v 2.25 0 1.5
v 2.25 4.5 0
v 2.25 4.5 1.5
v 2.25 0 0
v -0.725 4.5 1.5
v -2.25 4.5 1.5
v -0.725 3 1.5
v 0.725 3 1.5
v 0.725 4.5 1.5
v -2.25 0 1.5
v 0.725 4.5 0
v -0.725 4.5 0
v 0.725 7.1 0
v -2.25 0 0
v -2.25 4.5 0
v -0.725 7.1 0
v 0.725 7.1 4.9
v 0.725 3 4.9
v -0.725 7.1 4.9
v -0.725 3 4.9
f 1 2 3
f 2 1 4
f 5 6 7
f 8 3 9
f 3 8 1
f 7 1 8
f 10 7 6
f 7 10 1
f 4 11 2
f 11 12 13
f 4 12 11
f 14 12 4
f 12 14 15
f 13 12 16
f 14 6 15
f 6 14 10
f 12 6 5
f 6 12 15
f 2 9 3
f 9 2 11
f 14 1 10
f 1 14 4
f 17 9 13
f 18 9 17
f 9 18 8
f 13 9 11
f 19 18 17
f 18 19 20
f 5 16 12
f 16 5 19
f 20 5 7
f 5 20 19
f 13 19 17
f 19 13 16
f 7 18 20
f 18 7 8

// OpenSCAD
neckWidth = 1.45;
neckLength = 3.4;
neckHeight = 4.1;
overlap = 1.5;
attachmentWidth = 4.5;
attachmentDepth = 3;
attachmentThickness = 1.5;

module cubeCX(c) {
    translate([-0.5*c[0],0,0]) cube(c);
}

cubeCX([attachmentWidth,attachmentDepth+overlap,attachmentThickness]);
translate([0,attachmentDepth,0]) cubeCX([neckWidth,neckHeight,attachmentThickness+neckLength]);
